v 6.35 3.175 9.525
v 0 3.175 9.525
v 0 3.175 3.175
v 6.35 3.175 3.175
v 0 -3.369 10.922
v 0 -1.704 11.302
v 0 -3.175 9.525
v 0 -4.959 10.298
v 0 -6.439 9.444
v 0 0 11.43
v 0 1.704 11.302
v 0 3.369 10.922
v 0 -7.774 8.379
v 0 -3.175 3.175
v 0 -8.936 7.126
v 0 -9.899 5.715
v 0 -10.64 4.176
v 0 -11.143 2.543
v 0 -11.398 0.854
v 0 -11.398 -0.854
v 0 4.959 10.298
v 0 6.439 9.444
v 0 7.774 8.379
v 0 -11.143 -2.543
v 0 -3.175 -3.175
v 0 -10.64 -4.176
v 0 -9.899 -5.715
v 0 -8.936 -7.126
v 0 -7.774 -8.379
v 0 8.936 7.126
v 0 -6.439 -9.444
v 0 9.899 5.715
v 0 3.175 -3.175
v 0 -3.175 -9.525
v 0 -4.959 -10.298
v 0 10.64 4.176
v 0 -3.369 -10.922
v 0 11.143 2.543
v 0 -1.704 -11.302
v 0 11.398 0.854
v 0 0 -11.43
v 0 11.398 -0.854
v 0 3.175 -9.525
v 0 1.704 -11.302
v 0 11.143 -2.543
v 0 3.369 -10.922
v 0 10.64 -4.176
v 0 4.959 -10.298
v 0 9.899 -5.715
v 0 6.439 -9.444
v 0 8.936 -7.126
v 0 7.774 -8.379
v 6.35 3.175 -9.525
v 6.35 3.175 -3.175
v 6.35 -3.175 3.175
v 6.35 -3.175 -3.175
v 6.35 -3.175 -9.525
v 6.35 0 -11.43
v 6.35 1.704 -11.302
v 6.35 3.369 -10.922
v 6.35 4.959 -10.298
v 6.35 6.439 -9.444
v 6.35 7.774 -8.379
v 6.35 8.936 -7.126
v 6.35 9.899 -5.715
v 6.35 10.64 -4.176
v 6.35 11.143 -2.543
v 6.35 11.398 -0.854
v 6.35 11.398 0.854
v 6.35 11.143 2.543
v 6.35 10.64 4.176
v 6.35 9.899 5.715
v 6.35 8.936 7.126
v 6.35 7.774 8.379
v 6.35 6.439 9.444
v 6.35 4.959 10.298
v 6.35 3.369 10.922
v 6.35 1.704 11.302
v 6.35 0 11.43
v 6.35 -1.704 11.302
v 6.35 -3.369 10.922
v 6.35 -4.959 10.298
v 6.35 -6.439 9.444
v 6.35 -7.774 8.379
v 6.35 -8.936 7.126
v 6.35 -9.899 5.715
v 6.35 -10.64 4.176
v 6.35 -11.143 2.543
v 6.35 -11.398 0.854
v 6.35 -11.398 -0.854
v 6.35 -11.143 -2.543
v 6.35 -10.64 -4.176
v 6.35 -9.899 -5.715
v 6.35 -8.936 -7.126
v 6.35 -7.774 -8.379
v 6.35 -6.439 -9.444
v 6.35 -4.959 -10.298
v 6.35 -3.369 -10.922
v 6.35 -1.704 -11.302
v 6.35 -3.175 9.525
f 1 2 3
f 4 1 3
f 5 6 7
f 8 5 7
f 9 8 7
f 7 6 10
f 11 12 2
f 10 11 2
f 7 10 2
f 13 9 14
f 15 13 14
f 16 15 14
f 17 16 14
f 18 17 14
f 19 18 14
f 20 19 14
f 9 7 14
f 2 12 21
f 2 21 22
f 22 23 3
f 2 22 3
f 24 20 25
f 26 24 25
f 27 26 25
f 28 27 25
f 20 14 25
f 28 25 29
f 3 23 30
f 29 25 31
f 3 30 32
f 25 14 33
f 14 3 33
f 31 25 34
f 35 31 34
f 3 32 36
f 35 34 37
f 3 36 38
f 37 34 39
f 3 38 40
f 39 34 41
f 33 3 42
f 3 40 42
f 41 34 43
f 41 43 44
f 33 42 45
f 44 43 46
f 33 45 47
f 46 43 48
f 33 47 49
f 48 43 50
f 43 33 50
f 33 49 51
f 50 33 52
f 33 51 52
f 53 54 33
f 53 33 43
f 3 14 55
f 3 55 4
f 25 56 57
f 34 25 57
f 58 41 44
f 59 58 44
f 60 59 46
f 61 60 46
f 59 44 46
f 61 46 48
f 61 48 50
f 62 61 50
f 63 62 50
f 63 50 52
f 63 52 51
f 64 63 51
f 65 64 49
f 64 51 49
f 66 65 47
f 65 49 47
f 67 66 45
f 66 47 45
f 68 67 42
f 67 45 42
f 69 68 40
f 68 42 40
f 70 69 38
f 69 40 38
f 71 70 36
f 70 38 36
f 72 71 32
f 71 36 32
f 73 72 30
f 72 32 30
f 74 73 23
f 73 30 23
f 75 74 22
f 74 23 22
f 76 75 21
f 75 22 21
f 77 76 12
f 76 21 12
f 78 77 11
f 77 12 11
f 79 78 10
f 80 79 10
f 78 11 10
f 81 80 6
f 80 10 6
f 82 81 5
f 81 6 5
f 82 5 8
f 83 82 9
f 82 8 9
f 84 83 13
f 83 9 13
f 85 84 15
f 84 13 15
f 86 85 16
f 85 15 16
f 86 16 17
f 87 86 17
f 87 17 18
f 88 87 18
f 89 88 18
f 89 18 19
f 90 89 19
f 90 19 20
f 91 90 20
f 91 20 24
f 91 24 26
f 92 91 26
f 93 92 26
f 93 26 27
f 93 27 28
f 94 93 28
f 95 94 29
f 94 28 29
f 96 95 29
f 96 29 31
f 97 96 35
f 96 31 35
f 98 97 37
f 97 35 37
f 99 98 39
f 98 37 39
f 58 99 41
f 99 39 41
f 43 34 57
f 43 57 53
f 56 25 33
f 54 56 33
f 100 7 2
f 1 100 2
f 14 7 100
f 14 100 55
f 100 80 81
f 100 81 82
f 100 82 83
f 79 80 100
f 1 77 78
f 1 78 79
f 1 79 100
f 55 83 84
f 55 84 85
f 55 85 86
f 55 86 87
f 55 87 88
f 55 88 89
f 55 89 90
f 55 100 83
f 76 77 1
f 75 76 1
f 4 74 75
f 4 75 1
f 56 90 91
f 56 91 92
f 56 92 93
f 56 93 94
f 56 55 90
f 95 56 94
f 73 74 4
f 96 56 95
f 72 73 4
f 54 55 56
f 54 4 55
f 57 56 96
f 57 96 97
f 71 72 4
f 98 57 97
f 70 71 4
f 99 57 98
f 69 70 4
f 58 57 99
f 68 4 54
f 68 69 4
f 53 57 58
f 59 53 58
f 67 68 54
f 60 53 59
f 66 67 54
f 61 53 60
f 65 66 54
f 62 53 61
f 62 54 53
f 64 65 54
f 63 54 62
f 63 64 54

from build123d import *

# Parameters (mm, degrees)
SKETCH1_R           = 11.43
SKETCH1_W           = 6.35
SKETCH1_H           = 6.35
BOSS_EXTRUDE1_DEPTH = 6.35


with BuildPart() as part:
    # Sketch1 → Boss-Extrude1 (new body)
    with BuildSketch(Plane(origin=(0, 0, 0), x_dir=(0, 0, -1), z_dir=(1, 0, 0))):
        Circle(SKETCH1_R)
        with Locations((-6.35, 0)):
            Rectangle(SKETCH1_W, SKETCH1_H, mode=Mode.SUBTRACT)
        with Locations((6.35, 0)):
            Rectangle(SKETCH1_W, SKETCH1_H, mode=Mode.SUBTRACT)
    extrude(amount=BOSS_EXTRUDE1_DEPTH)


solid = part.part
